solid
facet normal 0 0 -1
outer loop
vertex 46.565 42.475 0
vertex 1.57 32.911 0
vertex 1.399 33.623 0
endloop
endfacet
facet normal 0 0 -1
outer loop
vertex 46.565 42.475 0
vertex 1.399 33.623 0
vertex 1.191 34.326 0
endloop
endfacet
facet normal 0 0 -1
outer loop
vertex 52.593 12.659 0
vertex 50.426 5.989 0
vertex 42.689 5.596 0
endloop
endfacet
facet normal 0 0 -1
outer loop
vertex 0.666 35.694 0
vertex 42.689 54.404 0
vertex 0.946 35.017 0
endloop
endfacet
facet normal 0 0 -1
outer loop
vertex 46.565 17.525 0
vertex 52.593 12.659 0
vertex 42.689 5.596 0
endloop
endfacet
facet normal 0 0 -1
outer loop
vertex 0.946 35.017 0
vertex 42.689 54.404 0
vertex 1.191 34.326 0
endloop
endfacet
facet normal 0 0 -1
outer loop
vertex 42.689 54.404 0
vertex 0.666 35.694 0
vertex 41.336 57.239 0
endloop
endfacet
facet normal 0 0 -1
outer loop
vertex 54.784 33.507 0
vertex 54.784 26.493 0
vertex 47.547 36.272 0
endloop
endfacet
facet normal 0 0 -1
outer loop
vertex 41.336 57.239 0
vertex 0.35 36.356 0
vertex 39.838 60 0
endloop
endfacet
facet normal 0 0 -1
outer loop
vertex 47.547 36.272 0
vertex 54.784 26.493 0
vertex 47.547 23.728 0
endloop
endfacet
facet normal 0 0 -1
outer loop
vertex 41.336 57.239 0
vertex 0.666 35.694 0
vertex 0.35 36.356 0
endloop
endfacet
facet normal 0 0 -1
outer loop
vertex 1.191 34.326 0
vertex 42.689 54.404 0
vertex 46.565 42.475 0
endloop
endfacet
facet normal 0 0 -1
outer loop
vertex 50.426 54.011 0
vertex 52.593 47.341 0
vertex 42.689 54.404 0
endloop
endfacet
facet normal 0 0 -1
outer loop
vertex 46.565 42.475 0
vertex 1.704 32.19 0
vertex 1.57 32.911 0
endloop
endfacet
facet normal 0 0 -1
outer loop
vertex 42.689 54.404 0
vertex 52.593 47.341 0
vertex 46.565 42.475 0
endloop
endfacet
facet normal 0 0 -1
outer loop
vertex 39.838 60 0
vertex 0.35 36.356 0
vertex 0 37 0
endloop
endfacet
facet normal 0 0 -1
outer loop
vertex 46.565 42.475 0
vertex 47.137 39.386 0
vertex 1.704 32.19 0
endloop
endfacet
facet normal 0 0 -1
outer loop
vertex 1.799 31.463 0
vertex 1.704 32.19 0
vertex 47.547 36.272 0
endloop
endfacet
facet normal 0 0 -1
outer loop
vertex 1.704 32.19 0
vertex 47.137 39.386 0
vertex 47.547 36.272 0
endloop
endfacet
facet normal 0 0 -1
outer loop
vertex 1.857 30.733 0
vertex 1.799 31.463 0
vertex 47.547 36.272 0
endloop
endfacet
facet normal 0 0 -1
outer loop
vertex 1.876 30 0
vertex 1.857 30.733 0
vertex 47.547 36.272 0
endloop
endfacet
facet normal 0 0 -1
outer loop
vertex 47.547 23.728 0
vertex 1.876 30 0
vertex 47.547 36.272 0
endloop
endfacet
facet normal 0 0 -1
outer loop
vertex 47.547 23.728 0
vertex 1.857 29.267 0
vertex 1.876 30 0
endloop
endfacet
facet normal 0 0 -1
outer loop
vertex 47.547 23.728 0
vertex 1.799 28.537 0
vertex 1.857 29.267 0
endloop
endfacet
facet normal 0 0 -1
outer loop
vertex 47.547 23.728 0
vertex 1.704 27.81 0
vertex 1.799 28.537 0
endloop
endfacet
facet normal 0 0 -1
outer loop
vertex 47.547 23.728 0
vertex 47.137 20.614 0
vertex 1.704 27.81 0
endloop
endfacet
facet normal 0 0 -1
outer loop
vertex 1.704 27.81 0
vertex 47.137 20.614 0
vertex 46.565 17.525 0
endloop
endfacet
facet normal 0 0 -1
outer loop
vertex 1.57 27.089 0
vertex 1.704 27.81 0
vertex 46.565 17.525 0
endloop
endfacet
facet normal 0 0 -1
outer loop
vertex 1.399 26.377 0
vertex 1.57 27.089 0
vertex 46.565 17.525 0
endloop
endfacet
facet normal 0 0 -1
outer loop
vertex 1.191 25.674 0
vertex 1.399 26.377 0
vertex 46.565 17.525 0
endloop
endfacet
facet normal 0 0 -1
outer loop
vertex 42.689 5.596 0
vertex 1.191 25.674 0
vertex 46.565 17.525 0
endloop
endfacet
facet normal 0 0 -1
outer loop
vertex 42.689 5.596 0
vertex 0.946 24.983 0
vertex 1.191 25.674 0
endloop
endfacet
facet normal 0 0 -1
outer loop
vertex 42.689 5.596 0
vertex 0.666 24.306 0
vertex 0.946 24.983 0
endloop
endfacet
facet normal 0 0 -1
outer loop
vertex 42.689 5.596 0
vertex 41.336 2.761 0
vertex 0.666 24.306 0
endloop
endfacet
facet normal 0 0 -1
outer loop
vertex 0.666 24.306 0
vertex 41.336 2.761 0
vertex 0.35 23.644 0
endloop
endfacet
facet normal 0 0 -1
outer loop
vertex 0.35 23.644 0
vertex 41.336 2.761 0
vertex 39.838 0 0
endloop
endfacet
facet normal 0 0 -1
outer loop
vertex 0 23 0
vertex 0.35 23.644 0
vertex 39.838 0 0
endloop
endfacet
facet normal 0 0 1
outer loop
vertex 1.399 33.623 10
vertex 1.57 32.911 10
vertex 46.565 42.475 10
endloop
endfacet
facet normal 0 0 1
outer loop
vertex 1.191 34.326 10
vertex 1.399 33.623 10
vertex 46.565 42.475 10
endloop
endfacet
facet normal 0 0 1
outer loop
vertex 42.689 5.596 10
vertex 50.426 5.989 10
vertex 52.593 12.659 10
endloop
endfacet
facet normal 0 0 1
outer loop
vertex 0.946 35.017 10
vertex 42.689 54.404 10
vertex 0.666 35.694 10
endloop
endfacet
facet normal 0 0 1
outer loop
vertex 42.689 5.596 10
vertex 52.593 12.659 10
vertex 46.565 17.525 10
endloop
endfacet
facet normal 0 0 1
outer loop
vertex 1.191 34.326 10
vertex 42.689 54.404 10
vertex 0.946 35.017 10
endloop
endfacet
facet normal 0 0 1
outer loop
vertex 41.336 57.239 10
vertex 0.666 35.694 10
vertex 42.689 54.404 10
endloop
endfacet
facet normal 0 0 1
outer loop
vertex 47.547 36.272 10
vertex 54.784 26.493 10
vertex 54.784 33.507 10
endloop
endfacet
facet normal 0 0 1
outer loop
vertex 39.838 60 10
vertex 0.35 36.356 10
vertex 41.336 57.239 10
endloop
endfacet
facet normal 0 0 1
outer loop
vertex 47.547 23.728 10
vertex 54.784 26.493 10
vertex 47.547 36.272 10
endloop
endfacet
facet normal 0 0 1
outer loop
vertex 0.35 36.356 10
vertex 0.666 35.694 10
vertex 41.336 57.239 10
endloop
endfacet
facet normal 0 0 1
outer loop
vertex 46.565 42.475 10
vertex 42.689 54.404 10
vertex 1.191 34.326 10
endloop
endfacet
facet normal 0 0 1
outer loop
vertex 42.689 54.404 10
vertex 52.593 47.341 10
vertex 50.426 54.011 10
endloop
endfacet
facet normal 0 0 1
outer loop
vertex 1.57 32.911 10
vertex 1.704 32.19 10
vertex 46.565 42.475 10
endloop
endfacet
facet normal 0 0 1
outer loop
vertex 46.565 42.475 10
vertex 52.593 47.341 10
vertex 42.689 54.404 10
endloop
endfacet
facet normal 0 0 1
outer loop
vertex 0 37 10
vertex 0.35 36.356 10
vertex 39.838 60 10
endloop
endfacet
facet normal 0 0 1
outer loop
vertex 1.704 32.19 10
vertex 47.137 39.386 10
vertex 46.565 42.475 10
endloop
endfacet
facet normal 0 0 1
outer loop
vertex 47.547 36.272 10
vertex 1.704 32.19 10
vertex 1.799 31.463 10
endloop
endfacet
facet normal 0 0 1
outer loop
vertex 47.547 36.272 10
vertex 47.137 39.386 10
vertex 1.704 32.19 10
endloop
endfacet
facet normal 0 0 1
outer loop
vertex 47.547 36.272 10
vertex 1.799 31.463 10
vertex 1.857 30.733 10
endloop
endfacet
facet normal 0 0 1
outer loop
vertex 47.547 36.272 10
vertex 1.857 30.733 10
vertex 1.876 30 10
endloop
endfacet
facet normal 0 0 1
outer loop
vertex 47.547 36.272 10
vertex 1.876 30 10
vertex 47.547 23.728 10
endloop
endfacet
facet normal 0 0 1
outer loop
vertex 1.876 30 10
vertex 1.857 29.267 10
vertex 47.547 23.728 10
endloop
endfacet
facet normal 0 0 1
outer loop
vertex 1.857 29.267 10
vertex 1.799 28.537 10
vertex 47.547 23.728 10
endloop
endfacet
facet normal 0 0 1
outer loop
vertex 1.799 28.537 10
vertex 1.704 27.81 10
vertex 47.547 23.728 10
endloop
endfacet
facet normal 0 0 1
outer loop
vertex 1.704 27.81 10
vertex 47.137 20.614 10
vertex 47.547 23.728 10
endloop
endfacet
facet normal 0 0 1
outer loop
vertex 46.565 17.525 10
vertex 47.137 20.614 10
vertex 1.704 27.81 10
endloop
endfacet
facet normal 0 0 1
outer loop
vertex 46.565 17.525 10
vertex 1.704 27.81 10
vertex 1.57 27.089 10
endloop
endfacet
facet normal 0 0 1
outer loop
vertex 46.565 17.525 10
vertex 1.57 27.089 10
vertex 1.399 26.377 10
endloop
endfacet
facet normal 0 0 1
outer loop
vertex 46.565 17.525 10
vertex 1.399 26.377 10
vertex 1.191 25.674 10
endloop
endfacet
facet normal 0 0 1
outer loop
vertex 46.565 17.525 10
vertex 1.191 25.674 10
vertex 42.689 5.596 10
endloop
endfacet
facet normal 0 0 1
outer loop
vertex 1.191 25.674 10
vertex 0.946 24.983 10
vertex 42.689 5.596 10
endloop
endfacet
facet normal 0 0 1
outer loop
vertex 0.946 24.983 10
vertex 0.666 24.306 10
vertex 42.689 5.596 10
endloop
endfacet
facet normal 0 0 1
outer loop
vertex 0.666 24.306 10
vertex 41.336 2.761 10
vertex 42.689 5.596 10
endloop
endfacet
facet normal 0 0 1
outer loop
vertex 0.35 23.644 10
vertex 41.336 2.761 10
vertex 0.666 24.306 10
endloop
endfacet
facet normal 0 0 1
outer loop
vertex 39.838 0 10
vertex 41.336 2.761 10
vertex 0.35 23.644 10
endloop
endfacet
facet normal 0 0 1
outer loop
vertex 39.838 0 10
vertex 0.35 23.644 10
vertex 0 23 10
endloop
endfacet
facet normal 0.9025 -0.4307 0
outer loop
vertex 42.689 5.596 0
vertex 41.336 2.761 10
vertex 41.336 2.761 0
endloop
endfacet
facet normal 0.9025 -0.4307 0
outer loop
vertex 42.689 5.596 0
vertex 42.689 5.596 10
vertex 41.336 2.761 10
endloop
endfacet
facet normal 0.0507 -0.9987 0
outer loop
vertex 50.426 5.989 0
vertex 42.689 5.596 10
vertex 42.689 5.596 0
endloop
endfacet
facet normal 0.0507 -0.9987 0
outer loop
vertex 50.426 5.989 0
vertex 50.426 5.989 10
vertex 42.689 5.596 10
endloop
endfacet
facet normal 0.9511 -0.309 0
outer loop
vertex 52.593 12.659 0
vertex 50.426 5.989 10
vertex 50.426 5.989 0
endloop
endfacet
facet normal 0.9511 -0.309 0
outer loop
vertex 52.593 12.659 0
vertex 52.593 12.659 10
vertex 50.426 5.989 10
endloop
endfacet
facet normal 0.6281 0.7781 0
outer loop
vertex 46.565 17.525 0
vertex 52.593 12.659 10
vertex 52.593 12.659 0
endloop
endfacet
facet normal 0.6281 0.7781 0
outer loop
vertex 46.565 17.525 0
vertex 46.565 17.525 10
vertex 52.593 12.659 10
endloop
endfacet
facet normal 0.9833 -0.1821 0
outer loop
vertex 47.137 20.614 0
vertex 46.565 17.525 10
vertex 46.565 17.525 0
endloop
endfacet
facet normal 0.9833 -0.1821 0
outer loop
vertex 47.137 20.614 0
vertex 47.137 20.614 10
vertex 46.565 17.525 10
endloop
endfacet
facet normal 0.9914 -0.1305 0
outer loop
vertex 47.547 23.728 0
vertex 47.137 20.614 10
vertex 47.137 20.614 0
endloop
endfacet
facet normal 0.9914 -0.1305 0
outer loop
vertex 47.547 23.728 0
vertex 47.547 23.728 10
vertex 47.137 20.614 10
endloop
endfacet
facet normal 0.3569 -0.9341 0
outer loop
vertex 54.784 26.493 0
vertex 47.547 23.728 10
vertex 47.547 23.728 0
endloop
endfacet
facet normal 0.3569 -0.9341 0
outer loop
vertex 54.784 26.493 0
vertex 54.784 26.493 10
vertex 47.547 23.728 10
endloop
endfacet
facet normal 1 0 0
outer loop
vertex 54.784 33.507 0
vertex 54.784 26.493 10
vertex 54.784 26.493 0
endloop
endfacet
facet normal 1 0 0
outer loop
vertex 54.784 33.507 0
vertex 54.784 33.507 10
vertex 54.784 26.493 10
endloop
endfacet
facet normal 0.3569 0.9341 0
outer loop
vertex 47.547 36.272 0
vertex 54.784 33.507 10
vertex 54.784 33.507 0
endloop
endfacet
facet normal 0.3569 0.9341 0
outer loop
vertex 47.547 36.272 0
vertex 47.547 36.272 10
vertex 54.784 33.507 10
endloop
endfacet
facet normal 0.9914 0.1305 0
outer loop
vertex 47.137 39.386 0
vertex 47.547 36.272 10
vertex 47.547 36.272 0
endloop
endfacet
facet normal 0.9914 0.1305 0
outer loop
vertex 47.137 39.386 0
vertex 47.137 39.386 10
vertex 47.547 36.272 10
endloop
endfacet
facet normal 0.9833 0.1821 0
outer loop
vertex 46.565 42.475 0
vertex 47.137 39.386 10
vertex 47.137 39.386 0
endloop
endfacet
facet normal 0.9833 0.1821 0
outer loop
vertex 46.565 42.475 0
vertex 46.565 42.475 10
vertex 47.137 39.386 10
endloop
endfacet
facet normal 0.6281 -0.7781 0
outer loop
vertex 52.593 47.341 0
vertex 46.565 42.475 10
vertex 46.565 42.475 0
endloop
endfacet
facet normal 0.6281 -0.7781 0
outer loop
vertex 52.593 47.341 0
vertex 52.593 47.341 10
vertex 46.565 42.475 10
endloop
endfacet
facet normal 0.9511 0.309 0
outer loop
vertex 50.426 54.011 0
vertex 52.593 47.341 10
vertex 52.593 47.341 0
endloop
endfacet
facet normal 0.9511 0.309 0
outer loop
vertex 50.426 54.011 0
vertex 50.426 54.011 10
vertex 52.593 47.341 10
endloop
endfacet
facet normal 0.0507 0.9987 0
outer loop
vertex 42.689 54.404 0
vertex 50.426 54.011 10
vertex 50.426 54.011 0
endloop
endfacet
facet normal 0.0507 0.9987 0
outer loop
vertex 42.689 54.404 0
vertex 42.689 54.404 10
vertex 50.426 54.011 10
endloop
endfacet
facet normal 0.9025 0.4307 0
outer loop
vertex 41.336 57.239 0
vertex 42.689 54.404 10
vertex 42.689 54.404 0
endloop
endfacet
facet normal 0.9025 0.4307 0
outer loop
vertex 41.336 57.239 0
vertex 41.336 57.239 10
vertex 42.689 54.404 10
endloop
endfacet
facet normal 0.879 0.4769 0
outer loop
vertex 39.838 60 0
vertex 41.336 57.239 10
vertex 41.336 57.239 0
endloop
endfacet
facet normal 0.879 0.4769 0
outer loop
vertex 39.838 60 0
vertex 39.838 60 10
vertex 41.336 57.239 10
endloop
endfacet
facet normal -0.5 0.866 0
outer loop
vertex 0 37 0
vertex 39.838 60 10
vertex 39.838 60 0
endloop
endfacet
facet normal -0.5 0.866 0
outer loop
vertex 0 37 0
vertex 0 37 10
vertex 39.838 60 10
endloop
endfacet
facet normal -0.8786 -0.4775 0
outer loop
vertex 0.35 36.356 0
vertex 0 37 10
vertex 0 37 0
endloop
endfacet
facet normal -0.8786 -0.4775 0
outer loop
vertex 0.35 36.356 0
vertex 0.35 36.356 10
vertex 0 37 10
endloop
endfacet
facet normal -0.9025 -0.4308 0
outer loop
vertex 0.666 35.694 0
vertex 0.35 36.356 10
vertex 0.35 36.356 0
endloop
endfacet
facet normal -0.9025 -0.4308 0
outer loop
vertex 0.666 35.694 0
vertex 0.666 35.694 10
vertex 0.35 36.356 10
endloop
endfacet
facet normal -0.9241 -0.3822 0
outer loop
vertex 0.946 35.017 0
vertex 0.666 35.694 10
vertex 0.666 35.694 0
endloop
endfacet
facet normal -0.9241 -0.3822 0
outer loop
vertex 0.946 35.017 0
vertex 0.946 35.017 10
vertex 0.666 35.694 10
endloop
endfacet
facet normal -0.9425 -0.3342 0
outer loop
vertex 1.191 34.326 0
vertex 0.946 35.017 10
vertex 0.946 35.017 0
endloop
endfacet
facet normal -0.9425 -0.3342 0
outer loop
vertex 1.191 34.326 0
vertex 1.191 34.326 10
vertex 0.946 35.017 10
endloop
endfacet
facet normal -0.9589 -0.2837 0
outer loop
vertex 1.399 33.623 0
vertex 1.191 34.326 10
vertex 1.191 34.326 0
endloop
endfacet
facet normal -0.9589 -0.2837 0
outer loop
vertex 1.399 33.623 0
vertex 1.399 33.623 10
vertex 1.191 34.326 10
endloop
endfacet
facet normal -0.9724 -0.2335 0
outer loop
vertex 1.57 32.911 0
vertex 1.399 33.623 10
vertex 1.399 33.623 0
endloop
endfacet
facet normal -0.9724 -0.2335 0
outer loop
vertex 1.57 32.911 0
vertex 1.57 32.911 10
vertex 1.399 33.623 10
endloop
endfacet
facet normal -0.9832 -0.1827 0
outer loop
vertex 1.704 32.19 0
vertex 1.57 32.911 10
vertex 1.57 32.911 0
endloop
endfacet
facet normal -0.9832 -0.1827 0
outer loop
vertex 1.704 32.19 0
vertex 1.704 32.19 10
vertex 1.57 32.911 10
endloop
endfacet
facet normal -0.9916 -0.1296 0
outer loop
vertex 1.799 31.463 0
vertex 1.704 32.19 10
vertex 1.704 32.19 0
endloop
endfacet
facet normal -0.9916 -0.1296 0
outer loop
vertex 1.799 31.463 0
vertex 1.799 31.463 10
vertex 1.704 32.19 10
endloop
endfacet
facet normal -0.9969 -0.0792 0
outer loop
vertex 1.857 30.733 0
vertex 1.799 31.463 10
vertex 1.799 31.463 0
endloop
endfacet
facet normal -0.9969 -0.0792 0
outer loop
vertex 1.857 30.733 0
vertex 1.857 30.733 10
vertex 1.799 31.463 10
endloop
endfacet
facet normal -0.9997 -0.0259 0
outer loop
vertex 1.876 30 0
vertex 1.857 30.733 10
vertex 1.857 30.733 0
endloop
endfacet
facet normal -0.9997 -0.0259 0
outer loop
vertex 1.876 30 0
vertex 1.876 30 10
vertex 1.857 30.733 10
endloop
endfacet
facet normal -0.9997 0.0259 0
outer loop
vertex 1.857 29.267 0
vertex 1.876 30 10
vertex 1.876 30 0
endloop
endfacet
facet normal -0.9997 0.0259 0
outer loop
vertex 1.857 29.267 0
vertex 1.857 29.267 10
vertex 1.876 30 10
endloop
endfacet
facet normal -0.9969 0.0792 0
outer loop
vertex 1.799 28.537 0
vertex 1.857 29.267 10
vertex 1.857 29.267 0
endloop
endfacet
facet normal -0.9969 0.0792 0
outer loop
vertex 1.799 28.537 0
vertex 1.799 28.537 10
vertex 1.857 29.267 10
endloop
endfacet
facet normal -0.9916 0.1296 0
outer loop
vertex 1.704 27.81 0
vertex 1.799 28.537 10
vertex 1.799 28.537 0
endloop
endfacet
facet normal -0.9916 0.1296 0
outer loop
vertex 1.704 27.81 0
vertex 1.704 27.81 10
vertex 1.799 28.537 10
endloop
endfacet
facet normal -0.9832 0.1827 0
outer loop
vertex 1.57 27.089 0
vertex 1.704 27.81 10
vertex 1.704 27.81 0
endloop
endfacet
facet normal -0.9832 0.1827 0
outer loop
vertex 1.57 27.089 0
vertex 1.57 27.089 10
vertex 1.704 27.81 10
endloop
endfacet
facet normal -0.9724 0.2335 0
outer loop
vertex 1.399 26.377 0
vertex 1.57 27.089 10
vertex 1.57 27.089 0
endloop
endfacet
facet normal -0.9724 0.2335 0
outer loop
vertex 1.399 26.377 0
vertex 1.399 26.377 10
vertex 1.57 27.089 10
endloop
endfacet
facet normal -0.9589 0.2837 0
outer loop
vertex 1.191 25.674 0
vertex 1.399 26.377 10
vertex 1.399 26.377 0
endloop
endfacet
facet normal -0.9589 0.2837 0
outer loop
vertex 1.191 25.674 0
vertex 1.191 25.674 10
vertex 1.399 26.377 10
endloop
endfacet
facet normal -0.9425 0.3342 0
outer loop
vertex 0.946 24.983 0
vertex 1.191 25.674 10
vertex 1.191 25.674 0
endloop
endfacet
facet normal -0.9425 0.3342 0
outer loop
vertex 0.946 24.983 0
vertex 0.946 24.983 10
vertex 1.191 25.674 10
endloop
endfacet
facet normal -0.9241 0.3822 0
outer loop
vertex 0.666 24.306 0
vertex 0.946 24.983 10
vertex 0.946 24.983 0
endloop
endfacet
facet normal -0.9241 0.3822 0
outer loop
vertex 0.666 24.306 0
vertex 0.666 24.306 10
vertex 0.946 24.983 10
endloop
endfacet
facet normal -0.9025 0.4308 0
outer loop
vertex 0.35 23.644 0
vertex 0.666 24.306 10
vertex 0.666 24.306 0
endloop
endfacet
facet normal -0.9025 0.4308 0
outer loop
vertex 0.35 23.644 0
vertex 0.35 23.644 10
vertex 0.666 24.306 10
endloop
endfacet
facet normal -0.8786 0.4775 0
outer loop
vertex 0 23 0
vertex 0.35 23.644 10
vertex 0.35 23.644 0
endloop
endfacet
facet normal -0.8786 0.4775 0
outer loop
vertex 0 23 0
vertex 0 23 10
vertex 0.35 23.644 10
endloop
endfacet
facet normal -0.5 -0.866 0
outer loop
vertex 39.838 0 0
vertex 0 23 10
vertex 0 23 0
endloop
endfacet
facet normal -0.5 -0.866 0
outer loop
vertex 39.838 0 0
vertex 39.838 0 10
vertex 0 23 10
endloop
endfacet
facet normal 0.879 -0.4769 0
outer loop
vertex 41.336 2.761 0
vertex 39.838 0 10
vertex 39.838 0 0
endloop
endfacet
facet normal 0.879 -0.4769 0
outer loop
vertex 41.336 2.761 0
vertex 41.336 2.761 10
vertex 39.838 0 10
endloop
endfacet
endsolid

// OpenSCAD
$fn = 32;

// ----------------------------------------------------------------------
// Gear sector: 3 teeth on 60 degrees
// ----------------------------------------------------------------------

// --- parameters (mm) ---
sector_angle = 60;        // sector angle, degrees
root_r = 60;              // root circle radius
tooth_h = 7;              // tooth height over the root circle
teeth = 3;                // number of teeth on the sector
hub_r = 14;               // hub bore radius
plate_t = 10;             // sector thickness, Z
arc_step = 3;             // sampling step of the root/hub arcs, degrees

tip_r = root_r + tooth_h;  // tip circle radius

profile = [[39.838, 0], [41.336, 2.761], [42.689, 5.596], [50.426, 5.989], [52.593, 12.659], [46.565, 17.525], [47.137, 20.614], [47.547, 23.728], [54.784, 26.493], [54.784, 33.507], [47.547, 36.272], [47.137, 39.386], [46.565, 42.475], [52.593, 47.341], [50.426, 54.011], [42.689, 54.404], [41.336, 57.239], [39.838, 60], [0, 37], [0.35, 36.356], [0.666, 35.694], [0.946, 35.017], [1.191, 34.326], [1.399, 33.623], [1.57, 32.911], [1.704, 32.19], [1.799, 31.463], [1.857, 30.733], [1.876, 30], [1.857, 29.267], [1.799, 28.537], [1.704, 27.81], [1.57, 27.089], [1.399, 26.377], [1.191, 25.674], [0.946, 24.983], [0.666, 24.306], [0.35, 23.644], [0, 23]];  // primary outline, 39 points, counter clockwise

// --- the one profile operation ---
linear_extrude(height = plate_t) polygon(points = profile);
